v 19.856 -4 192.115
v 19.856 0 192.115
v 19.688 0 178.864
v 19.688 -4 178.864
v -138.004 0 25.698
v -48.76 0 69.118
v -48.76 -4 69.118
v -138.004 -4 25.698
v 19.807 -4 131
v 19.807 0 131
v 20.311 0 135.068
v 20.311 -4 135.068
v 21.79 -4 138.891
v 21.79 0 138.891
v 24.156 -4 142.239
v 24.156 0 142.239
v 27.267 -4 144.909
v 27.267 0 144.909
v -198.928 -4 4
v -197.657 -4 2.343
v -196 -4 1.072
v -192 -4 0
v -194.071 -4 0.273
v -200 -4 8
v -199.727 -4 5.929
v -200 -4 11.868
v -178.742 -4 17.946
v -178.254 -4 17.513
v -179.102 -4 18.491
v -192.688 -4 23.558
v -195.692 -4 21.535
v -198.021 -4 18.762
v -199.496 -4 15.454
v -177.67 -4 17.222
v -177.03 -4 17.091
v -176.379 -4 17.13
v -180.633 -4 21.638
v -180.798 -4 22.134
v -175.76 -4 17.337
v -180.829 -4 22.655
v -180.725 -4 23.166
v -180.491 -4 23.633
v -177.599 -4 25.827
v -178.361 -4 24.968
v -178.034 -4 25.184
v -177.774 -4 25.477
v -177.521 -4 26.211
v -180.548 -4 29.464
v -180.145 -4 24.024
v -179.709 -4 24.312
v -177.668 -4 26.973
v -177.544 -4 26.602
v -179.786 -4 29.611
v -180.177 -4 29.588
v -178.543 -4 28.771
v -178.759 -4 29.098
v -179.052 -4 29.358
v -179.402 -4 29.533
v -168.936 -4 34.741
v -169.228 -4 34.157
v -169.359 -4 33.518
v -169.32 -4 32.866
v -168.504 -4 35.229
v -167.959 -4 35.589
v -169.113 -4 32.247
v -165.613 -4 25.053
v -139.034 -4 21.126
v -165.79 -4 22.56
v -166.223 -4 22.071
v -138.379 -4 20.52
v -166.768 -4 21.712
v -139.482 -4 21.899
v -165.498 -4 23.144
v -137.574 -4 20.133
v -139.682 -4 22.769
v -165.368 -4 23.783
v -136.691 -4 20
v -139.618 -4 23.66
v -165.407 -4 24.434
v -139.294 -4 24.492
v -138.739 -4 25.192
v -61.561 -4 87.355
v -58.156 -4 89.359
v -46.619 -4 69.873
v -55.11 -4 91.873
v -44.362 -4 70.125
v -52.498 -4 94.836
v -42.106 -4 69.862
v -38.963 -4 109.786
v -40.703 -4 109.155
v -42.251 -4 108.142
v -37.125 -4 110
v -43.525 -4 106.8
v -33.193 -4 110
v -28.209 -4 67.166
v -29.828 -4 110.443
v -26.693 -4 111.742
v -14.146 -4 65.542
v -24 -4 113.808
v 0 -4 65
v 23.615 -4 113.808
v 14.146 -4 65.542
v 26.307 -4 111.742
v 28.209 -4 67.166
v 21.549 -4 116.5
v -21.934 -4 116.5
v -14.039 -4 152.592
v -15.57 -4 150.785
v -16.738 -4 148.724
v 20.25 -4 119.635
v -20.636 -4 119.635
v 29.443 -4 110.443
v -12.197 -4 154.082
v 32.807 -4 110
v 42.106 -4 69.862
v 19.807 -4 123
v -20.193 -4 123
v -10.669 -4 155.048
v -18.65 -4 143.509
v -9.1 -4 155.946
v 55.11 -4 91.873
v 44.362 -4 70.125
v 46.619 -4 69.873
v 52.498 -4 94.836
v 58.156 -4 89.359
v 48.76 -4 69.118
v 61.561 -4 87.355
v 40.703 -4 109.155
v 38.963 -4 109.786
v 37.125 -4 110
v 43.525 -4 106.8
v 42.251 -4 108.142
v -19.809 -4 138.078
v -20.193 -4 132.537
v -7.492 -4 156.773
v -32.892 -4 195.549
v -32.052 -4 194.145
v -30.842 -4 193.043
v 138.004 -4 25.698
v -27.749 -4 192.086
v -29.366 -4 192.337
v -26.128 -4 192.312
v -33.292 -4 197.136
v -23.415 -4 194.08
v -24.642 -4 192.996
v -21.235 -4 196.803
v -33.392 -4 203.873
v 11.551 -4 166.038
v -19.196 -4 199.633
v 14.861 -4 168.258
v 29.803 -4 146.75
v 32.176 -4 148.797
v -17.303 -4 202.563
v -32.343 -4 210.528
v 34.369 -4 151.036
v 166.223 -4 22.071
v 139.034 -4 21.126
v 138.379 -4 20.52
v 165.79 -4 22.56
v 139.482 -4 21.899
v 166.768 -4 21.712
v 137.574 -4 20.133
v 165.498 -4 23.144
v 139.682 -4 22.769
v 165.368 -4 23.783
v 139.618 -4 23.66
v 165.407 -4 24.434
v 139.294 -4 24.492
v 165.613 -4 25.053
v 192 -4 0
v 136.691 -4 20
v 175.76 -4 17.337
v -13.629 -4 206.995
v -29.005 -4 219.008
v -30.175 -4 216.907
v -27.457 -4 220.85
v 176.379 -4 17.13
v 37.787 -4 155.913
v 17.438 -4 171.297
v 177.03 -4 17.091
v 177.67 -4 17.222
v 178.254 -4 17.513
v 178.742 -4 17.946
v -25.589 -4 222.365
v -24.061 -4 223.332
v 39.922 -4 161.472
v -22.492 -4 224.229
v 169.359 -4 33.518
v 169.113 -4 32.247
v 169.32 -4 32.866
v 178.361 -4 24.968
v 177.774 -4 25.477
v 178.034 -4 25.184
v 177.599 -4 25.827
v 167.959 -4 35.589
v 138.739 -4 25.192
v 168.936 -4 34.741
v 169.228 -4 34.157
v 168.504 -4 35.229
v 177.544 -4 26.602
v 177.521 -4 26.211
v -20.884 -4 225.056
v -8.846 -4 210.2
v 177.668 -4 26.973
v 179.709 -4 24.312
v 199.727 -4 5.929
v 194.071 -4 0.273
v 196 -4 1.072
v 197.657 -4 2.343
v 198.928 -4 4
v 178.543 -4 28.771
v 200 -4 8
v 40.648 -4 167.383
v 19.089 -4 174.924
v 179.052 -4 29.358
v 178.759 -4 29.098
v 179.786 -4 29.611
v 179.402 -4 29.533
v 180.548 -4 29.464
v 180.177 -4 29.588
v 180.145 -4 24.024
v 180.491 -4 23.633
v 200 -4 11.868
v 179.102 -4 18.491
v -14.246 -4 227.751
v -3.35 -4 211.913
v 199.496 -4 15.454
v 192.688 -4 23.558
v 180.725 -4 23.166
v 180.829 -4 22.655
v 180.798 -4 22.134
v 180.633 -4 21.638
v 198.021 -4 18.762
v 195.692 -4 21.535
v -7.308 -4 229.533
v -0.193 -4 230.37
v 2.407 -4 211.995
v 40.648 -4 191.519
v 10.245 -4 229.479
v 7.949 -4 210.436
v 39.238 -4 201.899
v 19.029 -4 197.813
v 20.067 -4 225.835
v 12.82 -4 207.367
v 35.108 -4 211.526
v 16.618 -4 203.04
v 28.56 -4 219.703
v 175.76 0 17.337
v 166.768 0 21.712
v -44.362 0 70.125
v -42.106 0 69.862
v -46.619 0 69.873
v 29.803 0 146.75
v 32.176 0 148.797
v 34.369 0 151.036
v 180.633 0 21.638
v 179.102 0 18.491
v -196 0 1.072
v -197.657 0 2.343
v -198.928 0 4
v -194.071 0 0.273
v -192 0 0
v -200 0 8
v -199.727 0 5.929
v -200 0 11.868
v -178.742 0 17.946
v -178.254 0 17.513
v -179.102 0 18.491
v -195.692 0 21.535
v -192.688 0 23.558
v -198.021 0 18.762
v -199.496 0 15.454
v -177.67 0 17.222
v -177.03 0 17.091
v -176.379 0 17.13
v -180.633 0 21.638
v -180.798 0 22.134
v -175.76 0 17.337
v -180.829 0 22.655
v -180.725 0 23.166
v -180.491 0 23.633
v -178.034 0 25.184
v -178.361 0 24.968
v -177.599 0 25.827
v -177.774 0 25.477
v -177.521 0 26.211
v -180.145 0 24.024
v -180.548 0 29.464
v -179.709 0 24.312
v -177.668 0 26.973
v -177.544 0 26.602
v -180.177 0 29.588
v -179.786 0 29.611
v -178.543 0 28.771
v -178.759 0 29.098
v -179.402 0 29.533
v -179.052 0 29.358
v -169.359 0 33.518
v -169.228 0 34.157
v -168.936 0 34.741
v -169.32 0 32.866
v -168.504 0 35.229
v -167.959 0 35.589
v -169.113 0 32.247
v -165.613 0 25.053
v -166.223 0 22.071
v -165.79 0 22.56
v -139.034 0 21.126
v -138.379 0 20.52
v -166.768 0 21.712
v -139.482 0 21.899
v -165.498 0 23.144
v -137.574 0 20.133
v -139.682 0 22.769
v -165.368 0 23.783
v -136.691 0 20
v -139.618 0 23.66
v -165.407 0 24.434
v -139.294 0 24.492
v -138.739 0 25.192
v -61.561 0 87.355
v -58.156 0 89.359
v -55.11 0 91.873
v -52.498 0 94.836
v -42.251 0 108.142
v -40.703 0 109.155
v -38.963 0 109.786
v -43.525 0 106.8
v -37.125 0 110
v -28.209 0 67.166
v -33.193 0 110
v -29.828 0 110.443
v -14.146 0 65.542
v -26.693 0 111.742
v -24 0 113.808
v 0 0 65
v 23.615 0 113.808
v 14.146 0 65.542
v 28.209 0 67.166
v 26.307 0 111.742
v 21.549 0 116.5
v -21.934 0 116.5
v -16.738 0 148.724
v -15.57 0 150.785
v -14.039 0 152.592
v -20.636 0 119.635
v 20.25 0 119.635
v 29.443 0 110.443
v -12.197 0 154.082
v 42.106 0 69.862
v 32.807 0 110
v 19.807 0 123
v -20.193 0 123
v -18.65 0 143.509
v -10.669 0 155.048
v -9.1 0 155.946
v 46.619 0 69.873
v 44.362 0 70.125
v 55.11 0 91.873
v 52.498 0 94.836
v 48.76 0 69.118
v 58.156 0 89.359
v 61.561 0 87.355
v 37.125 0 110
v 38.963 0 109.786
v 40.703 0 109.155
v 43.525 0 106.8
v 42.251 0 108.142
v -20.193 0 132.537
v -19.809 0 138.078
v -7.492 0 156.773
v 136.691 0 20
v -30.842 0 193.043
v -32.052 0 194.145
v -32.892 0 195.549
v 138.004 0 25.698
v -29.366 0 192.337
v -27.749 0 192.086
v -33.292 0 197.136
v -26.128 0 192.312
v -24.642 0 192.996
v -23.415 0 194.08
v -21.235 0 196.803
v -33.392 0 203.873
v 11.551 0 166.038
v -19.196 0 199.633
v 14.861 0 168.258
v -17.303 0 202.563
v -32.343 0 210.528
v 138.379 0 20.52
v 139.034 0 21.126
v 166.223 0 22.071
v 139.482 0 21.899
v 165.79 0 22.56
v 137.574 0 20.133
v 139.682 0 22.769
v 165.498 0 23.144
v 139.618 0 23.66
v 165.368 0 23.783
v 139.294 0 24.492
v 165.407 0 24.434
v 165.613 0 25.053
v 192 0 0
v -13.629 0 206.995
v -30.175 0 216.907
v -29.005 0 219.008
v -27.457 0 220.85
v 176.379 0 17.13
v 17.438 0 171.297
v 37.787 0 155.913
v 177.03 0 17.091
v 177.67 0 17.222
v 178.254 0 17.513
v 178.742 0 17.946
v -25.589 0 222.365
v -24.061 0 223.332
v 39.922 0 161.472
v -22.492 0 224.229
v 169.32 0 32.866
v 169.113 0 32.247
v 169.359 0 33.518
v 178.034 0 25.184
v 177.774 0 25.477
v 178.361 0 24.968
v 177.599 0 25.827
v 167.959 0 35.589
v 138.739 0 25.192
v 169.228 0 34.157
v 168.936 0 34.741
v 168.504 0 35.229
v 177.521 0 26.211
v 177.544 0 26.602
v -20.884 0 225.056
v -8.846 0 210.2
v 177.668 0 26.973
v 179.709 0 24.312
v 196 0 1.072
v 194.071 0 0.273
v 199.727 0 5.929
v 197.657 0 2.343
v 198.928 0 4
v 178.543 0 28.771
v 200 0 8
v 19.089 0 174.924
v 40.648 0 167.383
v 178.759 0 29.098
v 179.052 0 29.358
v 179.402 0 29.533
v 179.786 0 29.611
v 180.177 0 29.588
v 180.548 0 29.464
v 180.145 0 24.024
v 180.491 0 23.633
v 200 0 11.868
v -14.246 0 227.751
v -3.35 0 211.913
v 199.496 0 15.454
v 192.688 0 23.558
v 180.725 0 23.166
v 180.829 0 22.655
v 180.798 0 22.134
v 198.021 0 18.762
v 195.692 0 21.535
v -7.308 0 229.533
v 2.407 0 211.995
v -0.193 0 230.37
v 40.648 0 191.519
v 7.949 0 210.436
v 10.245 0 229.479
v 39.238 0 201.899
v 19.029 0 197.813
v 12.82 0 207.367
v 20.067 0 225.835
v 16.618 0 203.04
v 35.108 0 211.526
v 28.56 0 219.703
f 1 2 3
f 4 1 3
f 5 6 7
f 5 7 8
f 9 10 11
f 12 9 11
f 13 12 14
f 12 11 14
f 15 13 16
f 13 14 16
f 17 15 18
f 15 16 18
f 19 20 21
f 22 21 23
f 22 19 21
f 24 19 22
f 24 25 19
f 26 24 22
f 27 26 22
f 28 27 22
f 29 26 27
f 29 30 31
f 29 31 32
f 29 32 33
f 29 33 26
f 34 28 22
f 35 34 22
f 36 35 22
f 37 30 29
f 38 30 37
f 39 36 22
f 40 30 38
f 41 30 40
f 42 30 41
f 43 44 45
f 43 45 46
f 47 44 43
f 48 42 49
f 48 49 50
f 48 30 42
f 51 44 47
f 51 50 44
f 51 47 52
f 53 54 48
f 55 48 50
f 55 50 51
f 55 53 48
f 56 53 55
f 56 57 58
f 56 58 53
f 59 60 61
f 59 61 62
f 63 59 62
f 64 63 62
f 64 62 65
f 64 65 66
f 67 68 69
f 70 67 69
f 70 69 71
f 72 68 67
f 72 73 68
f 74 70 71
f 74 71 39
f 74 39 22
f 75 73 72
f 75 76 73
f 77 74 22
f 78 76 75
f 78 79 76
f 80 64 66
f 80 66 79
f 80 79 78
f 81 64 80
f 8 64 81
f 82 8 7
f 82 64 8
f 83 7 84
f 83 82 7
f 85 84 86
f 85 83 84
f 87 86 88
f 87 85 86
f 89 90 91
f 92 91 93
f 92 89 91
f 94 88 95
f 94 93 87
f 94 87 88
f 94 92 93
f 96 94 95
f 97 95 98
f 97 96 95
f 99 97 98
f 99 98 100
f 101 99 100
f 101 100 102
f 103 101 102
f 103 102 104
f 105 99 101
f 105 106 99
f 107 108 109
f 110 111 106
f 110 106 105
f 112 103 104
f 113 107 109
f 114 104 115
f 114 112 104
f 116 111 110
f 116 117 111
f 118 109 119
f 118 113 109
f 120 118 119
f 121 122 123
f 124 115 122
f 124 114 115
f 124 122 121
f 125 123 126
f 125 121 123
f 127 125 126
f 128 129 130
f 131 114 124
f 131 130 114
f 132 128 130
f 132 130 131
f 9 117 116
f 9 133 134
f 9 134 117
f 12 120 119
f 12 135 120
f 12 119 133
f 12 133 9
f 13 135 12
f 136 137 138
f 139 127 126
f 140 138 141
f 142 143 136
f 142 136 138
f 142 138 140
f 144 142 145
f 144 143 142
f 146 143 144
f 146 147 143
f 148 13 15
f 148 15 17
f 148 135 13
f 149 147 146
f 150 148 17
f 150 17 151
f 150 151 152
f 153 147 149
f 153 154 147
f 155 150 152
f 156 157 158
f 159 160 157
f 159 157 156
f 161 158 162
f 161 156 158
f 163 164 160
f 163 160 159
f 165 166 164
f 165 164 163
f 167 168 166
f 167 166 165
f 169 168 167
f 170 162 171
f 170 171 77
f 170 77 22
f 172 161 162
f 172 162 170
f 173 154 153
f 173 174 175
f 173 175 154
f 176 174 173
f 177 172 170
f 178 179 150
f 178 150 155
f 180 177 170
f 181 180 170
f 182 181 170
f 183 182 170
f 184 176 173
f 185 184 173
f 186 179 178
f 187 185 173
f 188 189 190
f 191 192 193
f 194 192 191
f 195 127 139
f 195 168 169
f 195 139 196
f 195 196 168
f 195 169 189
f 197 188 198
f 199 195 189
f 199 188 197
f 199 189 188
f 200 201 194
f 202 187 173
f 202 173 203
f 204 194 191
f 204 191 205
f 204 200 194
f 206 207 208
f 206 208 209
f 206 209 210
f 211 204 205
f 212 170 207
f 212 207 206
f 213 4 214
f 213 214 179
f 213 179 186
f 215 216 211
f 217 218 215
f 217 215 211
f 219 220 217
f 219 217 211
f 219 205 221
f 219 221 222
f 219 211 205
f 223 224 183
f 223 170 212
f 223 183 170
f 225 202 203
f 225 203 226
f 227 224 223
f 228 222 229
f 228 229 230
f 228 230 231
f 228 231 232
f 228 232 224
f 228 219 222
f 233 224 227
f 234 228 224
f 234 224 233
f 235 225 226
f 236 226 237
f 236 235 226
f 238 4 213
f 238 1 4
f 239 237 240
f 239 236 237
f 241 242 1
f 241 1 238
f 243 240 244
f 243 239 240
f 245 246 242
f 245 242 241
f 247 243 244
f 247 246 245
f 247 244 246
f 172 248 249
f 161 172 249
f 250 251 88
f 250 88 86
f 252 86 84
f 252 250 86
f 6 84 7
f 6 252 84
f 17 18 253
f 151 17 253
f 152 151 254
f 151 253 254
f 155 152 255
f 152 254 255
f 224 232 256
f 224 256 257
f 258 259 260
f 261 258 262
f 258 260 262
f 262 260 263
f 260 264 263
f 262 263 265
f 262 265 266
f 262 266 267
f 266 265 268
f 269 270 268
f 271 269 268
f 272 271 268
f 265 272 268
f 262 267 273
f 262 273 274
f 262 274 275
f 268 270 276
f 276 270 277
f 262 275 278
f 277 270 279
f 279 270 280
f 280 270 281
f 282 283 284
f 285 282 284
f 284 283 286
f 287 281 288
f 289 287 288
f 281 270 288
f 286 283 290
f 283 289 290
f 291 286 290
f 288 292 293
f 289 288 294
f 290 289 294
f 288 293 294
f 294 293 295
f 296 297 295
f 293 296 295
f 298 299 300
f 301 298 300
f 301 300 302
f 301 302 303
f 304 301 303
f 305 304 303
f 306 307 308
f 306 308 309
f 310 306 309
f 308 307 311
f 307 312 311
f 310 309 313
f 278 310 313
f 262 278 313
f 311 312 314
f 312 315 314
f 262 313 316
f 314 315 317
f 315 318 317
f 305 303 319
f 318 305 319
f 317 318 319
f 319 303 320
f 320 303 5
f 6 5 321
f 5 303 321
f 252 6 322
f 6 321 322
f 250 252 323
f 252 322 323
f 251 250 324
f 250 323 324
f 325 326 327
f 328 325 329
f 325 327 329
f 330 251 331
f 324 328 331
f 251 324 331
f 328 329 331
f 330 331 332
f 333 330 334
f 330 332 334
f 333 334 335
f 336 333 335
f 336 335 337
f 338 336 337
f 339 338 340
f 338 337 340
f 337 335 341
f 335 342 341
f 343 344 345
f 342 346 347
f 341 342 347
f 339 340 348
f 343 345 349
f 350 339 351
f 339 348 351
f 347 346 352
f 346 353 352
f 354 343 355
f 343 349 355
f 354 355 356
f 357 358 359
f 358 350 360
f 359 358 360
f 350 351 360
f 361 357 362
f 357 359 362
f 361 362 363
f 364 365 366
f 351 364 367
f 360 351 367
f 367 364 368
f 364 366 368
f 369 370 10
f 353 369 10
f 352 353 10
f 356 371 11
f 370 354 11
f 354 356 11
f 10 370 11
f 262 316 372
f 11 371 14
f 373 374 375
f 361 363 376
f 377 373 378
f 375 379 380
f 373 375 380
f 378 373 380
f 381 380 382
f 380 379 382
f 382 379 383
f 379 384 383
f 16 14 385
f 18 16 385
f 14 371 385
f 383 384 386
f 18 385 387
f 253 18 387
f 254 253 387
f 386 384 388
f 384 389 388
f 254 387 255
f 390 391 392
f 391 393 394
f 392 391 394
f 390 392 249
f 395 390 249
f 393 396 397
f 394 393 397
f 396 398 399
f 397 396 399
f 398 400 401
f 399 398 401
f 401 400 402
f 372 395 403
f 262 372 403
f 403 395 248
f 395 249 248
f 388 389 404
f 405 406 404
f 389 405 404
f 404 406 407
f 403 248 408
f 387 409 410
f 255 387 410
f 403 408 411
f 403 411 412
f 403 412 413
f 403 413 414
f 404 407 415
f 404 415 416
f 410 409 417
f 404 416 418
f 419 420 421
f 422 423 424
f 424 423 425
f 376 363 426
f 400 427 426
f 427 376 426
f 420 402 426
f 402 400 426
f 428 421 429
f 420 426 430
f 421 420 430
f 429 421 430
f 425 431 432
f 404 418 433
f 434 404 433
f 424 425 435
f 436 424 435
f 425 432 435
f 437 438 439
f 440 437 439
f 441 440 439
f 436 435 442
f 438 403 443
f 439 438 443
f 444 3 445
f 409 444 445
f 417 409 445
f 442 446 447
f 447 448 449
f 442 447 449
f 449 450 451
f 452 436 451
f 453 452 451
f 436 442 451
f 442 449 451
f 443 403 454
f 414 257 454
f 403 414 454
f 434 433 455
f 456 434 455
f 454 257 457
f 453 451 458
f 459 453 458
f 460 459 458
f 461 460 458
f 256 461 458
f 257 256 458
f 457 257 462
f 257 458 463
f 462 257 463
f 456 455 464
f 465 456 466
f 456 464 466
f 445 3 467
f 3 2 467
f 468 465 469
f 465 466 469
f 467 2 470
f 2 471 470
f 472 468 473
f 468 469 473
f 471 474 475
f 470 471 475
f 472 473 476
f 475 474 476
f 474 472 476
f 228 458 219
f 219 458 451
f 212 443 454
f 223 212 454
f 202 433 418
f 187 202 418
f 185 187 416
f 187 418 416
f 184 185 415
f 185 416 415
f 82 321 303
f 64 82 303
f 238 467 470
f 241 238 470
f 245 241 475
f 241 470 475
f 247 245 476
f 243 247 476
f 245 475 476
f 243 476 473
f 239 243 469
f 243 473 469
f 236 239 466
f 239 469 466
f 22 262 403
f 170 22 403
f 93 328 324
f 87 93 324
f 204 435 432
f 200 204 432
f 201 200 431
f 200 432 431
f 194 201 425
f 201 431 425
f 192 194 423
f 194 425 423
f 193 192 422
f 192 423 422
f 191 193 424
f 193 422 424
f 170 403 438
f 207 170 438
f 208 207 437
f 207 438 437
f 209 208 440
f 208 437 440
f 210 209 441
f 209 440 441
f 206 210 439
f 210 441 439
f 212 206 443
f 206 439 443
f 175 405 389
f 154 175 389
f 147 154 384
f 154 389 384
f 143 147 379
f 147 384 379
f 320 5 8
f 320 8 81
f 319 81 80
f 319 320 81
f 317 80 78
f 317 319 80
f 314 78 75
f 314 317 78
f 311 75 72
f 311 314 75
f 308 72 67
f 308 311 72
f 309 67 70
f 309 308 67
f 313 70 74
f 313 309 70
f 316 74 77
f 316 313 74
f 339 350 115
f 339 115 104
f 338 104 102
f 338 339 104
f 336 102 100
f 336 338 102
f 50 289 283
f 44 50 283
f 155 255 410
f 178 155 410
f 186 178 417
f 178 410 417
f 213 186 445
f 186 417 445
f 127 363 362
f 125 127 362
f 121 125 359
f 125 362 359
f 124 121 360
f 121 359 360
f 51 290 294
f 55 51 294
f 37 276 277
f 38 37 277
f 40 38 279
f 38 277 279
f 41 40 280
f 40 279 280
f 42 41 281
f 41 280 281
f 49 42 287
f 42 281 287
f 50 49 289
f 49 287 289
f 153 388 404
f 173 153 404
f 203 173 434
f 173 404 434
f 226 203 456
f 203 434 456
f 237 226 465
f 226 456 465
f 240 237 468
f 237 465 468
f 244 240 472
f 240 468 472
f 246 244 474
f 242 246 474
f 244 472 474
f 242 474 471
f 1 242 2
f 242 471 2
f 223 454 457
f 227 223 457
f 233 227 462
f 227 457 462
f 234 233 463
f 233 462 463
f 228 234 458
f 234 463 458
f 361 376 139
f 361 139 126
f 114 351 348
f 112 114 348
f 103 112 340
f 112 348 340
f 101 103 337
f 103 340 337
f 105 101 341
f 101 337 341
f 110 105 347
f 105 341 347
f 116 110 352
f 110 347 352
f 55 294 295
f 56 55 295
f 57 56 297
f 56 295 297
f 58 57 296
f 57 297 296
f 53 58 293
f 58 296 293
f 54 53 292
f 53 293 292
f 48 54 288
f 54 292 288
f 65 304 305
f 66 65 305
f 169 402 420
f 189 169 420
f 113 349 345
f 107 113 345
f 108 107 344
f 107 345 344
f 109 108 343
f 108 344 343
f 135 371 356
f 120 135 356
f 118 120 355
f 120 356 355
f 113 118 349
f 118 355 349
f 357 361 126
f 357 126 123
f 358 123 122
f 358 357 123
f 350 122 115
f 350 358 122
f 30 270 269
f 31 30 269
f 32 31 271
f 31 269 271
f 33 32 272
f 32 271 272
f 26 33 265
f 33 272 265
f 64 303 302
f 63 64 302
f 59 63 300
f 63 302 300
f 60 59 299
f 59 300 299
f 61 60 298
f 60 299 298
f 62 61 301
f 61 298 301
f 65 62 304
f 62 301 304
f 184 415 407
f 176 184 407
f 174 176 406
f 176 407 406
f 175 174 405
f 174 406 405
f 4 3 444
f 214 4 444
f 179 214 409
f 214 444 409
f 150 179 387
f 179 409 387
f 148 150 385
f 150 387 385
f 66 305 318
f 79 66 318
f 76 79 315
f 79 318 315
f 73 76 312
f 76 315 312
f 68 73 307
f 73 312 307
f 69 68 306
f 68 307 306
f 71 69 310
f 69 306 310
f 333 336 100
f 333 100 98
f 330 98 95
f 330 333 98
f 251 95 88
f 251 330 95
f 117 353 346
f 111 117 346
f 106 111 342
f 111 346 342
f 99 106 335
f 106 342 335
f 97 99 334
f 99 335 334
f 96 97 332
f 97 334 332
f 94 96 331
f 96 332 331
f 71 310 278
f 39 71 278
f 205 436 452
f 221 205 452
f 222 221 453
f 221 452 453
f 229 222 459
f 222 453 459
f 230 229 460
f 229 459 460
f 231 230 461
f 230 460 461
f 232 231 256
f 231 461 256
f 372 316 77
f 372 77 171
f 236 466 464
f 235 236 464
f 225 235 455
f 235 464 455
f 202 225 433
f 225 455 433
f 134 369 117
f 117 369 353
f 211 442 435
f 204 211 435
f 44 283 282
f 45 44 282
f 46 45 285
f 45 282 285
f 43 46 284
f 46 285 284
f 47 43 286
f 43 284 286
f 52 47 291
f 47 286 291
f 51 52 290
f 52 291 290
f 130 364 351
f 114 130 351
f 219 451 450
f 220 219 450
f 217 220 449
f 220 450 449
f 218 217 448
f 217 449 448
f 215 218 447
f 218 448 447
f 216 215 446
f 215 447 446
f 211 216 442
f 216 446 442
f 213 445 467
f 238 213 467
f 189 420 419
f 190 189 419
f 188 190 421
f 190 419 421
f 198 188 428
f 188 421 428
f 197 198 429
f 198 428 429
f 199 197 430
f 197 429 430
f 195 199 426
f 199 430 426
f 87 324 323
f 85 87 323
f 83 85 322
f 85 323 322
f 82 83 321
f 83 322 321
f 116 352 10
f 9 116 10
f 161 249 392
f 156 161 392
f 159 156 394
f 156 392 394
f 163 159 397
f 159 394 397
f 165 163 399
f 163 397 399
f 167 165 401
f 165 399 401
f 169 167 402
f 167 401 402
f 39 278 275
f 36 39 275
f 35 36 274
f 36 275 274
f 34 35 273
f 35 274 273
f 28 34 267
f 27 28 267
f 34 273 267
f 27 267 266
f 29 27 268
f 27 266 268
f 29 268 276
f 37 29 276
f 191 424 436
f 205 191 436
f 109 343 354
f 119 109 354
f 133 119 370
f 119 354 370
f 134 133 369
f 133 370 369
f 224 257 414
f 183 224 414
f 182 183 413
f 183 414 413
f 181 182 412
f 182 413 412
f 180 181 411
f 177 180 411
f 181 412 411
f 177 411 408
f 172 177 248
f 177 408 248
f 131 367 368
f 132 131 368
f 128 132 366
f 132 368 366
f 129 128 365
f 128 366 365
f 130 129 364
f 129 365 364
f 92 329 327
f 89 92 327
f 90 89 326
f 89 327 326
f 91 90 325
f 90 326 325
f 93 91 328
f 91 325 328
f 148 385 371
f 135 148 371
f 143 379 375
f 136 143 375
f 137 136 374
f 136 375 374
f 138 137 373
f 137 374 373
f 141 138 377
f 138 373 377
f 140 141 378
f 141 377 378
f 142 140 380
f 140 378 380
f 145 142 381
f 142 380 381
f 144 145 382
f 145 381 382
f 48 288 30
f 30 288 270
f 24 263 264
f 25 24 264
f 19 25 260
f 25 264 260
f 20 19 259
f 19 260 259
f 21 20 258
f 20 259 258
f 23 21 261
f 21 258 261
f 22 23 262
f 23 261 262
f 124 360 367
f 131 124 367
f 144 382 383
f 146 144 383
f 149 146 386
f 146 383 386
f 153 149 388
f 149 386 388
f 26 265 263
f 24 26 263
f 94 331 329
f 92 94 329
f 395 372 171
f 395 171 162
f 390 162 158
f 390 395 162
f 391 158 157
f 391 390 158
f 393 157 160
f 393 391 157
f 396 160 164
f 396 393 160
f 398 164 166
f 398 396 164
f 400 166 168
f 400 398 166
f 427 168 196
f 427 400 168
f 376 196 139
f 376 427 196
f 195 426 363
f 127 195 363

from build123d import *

# Parameters (mm, degrees)
F4_DEPTH = 4
F5_DEPTH = 25
F6_DEPTH = 4


with BuildPart() as f4:
    # F1 (on Front) → F4 (new body)
    with BuildSketch(Plane.XZ):
        with BuildLine():
            Line((-192, 0), (0, 0))
            Line((0, 0), (192, 0))
            ThreePointArc((192, 0), (197.656854, 2.343146), (200, 8))
            Line((200, 8), (200, 11.867938))
            ThreePointArc((200, 11.867938), (198.021286, 18.762229), (192.6875, 23.557777))
            Line((192.6875, 23.557777), (180.548051, 29.464027))
            ThreePointArc((180.548051, 29.464027), (179.402075, 29.533004), (178.542974, 28.77145))
            Line((178.542974, 28.77145), (177.667974, 26.973013))
            ThreePointArc((177.667974, 26.973013), (177.598997, 25.827036), (178.360551, 24.967935))
            Line((178.360551, 24.967935), (179.709379, 24.311685))
            ThreePointArc((179.709379, 24.311685), (180.724784, 23.166217), (180.632816, 21.638248))
            Line((180.632816, 21.638248), (179.101566, 18.490984))
            ThreePointArc((179.101566, 18.490984), (177.66973, 17.221727), (175.75977, 17.336688))
            Line((175.75977, 17.336688), (166.767586, 21.711688))
            ThreePointArc((166.767586, 21.711688), (165.498329, 23.143523), (165.61329, 25.053484))
            Line((165.61329, 25.053484), (169.11329, 32.247231))
            ThreePointArc((169.11329, 32.247231), (169.22825, 34.157192), (167.958994, 35.589027))
            Line((167.958994, 35.589027), (61.560664, 87.355393))
            ThreePointArc((61.560664, 87.355393), (56.583657, 90.555592), (52.498164, 94.835853))
            Line((52.498164, 94.835853), (43.525054, 106.8))
            ThreePointArc((43.525054, 106.8), (40.702763, 109.155418), (37.125054, 110))
            Line((37.125054, 110), (0, 110))
            Line((0, 110), (-37.125054, 110))
            ThreePointArc((-37.125054, 110), (-40.702763, 109.155418), (-43.525054, 106.8))
            Line((-43.525054, 106.8), (-52.498164, 94.835853))
            ThreePointArc((-52.498164, 94.835853), (-56.583657, 90.555592), (-61.560664, 87.355393))
            Line((-61.560664, 87.355393), (-167.958994, 35.589027))
            ThreePointArc((-167.958994, 35.589027), (-169.22825, 34.157192), (-169.11329, 32.247231))
            Line((-169.11329, 32.247231), (-165.61329, 25.053484))
            ThreePointArc((-165.61329, 25.053484), (-165.498329, 23.143523), (-166.767586, 21.711688))
            Line((-166.767586, 21.711688), (-175.75977, 17.336688))
            ThreePointArc((-175.75977, 17.336688), (-177.66973, 17.221727), (-179.101566, 18.490984))
            Line((-179.101566, 18.490984), (-180.632816, 21.638248))
            ThreePointArc((-180.632816, 21.638248), (-180.724784, 23.166217), (-179.709379, 24.311685))
            Line((-179.709379, 24.311685), (-178.360551, 24.967935))
            ThreePointArc((-178.360551, 24.967935), (-177.598997, 25.827036), (-177.667974, 26.973013))
            Line((-177.667974, 26.973013), (-178.542974, 28.77145))
            ThreePointArc((-178.542974, 28.77145), (-179.402075, 29.533004), (-180.548051, 29.464027))
            Line((-180.548051, 29.464027), (-192.6875, 23.557777))
            ThreePointArc((-192.6875, 23.557777), (-198.021286, 18.762229), (-200, 11.867938))
            Line((-200, 11.867938), (-200, 8))
            ThreePointArc((-200, 8), (-197.656854, 2.343146), (-192, 0))
        make_face()
    extrude(amount=F4_DEPTH)

    # F2 (on Front) → F5 (cut)
    with BuildSketch(Plane.XZ):
        with BuildLine():
            Line((-48.760248, 69.117535), (-138.003574, 25.697655))
            ThreePointArc((-138.003574, 25.697655), (-139.614511, 22.326563), (-136.691074, 20))
            Line((-136.691074, 20), (0, 20))
            Line((0, 20), (136.691074, 20))
            ThreePointArc((136.691074, 20), (139.614511, 22.326563), (138.003574, 25.697655))
            Line((138.003574, 25.697655), (48.760248, 69.117535))
            ThreePointArc((48.760248, 69.117535), (45.497375, 70.063317), (42.106154, 69.862174))
            ThreePointArc((42.106154, 69.862174), (21.192976, 66.219569), (0, 65))
            ThreePointArc((0, 65), (-21.192976, 66.219569), (-42.106154, 69.862174))
            ThreePointArc((-42.106154, 69.862174), (-45.497375, 70.063317), (-48.760248, 69.117535))
        make_face()
    extrude(amount=F5_DEPTH, mode=Mode.SUBTRACT)

    # F3 (on Front) → F6 (join)
    with BuildSketch(Plane.XZ):
        with BuildLine():
            ThreePointArc((32.807421, 110), (23.615033, 113.807612), (19.807421, 123))
            Line((19.807421, 123), (19.807421, 131))
            ThreePointArc((19.807421, 131), (21.789998, 138.891463), (27.266909, 144.908874))
            ThreePointArc((27.266909, 144.908874), (31.010618, 147.749106), (34.369203, 151.035771))
            ThreePointArc((34.369203, 151.035771), (39.024484, 158.627298), (40.648222, 167.383233))
            Line((40.648222, 167.383233), (40.648222, 191.518757))
            ThreePointArc((40.648222, 191.518757), (28.5597, 219.702824), (-0.19253, 230.369747))
            ThreePointArc((-0.19253, 230.369747), (-10.806946, 228.758492), (-20.884333, 225.056026))
            ThreePointArc((-20.884333, 225.056026), (-23.281736, 223.789035), (-25.589338, 222.365034))
            ThreePointArc((-25.589338, 222.365034), (-28.274915, 219.966), (-30.175497, 216.907327))
            ThreePointArc((-30.175497, 216.907327), (-33.010051, 207.223067), (-33.292141, 197.136441))
            ThreePointArc((-33.292141, 197.136441), (-29.36617, 192.336543), (-23.415442, 194.080419))
            ThreePointArc((-23.415442, 194.080419), (-20.197771, 198.205206), (-17.303473, 202.562993))
            ThreePointArc((-17.303473, 202.562993), (5.233861, 211.415378), (19.855876, 192.115305))
            Line((19.855876, 192.115305), (19.688146, 178.864043))
            ThreePointArc((19.688146, 178.864043), (17.438414, 171.2971), (11.551299, 166.037652))
            Line((11.551299, 166.037652), (-7.491809, 156.772539))
            ThreePointArc((-7.491809, 156.772539), (-9.889212, 155.505548), (-12.196814, 154.081547))
            ThreePointArc((-12.196814, 154.081547), (-14.846888, 151.724576), (-16.738336, 148.724473))
            ThreePointArc((-16.738336, 148.724473), (-19.325033, 140.813993), (-20.192579, 132.536671))
            Line((-20.192579, 132.536671), (-20.192579, 123))
            ThreePointArc((-20.192579, 123), (-24.000191, 113.807612), (-33.192579, 110))
            Line((-33.192579, 110), (32.807421, 110))
        make_face()
    extrude(amount=F6_DEPTH)


solid = f4.part
